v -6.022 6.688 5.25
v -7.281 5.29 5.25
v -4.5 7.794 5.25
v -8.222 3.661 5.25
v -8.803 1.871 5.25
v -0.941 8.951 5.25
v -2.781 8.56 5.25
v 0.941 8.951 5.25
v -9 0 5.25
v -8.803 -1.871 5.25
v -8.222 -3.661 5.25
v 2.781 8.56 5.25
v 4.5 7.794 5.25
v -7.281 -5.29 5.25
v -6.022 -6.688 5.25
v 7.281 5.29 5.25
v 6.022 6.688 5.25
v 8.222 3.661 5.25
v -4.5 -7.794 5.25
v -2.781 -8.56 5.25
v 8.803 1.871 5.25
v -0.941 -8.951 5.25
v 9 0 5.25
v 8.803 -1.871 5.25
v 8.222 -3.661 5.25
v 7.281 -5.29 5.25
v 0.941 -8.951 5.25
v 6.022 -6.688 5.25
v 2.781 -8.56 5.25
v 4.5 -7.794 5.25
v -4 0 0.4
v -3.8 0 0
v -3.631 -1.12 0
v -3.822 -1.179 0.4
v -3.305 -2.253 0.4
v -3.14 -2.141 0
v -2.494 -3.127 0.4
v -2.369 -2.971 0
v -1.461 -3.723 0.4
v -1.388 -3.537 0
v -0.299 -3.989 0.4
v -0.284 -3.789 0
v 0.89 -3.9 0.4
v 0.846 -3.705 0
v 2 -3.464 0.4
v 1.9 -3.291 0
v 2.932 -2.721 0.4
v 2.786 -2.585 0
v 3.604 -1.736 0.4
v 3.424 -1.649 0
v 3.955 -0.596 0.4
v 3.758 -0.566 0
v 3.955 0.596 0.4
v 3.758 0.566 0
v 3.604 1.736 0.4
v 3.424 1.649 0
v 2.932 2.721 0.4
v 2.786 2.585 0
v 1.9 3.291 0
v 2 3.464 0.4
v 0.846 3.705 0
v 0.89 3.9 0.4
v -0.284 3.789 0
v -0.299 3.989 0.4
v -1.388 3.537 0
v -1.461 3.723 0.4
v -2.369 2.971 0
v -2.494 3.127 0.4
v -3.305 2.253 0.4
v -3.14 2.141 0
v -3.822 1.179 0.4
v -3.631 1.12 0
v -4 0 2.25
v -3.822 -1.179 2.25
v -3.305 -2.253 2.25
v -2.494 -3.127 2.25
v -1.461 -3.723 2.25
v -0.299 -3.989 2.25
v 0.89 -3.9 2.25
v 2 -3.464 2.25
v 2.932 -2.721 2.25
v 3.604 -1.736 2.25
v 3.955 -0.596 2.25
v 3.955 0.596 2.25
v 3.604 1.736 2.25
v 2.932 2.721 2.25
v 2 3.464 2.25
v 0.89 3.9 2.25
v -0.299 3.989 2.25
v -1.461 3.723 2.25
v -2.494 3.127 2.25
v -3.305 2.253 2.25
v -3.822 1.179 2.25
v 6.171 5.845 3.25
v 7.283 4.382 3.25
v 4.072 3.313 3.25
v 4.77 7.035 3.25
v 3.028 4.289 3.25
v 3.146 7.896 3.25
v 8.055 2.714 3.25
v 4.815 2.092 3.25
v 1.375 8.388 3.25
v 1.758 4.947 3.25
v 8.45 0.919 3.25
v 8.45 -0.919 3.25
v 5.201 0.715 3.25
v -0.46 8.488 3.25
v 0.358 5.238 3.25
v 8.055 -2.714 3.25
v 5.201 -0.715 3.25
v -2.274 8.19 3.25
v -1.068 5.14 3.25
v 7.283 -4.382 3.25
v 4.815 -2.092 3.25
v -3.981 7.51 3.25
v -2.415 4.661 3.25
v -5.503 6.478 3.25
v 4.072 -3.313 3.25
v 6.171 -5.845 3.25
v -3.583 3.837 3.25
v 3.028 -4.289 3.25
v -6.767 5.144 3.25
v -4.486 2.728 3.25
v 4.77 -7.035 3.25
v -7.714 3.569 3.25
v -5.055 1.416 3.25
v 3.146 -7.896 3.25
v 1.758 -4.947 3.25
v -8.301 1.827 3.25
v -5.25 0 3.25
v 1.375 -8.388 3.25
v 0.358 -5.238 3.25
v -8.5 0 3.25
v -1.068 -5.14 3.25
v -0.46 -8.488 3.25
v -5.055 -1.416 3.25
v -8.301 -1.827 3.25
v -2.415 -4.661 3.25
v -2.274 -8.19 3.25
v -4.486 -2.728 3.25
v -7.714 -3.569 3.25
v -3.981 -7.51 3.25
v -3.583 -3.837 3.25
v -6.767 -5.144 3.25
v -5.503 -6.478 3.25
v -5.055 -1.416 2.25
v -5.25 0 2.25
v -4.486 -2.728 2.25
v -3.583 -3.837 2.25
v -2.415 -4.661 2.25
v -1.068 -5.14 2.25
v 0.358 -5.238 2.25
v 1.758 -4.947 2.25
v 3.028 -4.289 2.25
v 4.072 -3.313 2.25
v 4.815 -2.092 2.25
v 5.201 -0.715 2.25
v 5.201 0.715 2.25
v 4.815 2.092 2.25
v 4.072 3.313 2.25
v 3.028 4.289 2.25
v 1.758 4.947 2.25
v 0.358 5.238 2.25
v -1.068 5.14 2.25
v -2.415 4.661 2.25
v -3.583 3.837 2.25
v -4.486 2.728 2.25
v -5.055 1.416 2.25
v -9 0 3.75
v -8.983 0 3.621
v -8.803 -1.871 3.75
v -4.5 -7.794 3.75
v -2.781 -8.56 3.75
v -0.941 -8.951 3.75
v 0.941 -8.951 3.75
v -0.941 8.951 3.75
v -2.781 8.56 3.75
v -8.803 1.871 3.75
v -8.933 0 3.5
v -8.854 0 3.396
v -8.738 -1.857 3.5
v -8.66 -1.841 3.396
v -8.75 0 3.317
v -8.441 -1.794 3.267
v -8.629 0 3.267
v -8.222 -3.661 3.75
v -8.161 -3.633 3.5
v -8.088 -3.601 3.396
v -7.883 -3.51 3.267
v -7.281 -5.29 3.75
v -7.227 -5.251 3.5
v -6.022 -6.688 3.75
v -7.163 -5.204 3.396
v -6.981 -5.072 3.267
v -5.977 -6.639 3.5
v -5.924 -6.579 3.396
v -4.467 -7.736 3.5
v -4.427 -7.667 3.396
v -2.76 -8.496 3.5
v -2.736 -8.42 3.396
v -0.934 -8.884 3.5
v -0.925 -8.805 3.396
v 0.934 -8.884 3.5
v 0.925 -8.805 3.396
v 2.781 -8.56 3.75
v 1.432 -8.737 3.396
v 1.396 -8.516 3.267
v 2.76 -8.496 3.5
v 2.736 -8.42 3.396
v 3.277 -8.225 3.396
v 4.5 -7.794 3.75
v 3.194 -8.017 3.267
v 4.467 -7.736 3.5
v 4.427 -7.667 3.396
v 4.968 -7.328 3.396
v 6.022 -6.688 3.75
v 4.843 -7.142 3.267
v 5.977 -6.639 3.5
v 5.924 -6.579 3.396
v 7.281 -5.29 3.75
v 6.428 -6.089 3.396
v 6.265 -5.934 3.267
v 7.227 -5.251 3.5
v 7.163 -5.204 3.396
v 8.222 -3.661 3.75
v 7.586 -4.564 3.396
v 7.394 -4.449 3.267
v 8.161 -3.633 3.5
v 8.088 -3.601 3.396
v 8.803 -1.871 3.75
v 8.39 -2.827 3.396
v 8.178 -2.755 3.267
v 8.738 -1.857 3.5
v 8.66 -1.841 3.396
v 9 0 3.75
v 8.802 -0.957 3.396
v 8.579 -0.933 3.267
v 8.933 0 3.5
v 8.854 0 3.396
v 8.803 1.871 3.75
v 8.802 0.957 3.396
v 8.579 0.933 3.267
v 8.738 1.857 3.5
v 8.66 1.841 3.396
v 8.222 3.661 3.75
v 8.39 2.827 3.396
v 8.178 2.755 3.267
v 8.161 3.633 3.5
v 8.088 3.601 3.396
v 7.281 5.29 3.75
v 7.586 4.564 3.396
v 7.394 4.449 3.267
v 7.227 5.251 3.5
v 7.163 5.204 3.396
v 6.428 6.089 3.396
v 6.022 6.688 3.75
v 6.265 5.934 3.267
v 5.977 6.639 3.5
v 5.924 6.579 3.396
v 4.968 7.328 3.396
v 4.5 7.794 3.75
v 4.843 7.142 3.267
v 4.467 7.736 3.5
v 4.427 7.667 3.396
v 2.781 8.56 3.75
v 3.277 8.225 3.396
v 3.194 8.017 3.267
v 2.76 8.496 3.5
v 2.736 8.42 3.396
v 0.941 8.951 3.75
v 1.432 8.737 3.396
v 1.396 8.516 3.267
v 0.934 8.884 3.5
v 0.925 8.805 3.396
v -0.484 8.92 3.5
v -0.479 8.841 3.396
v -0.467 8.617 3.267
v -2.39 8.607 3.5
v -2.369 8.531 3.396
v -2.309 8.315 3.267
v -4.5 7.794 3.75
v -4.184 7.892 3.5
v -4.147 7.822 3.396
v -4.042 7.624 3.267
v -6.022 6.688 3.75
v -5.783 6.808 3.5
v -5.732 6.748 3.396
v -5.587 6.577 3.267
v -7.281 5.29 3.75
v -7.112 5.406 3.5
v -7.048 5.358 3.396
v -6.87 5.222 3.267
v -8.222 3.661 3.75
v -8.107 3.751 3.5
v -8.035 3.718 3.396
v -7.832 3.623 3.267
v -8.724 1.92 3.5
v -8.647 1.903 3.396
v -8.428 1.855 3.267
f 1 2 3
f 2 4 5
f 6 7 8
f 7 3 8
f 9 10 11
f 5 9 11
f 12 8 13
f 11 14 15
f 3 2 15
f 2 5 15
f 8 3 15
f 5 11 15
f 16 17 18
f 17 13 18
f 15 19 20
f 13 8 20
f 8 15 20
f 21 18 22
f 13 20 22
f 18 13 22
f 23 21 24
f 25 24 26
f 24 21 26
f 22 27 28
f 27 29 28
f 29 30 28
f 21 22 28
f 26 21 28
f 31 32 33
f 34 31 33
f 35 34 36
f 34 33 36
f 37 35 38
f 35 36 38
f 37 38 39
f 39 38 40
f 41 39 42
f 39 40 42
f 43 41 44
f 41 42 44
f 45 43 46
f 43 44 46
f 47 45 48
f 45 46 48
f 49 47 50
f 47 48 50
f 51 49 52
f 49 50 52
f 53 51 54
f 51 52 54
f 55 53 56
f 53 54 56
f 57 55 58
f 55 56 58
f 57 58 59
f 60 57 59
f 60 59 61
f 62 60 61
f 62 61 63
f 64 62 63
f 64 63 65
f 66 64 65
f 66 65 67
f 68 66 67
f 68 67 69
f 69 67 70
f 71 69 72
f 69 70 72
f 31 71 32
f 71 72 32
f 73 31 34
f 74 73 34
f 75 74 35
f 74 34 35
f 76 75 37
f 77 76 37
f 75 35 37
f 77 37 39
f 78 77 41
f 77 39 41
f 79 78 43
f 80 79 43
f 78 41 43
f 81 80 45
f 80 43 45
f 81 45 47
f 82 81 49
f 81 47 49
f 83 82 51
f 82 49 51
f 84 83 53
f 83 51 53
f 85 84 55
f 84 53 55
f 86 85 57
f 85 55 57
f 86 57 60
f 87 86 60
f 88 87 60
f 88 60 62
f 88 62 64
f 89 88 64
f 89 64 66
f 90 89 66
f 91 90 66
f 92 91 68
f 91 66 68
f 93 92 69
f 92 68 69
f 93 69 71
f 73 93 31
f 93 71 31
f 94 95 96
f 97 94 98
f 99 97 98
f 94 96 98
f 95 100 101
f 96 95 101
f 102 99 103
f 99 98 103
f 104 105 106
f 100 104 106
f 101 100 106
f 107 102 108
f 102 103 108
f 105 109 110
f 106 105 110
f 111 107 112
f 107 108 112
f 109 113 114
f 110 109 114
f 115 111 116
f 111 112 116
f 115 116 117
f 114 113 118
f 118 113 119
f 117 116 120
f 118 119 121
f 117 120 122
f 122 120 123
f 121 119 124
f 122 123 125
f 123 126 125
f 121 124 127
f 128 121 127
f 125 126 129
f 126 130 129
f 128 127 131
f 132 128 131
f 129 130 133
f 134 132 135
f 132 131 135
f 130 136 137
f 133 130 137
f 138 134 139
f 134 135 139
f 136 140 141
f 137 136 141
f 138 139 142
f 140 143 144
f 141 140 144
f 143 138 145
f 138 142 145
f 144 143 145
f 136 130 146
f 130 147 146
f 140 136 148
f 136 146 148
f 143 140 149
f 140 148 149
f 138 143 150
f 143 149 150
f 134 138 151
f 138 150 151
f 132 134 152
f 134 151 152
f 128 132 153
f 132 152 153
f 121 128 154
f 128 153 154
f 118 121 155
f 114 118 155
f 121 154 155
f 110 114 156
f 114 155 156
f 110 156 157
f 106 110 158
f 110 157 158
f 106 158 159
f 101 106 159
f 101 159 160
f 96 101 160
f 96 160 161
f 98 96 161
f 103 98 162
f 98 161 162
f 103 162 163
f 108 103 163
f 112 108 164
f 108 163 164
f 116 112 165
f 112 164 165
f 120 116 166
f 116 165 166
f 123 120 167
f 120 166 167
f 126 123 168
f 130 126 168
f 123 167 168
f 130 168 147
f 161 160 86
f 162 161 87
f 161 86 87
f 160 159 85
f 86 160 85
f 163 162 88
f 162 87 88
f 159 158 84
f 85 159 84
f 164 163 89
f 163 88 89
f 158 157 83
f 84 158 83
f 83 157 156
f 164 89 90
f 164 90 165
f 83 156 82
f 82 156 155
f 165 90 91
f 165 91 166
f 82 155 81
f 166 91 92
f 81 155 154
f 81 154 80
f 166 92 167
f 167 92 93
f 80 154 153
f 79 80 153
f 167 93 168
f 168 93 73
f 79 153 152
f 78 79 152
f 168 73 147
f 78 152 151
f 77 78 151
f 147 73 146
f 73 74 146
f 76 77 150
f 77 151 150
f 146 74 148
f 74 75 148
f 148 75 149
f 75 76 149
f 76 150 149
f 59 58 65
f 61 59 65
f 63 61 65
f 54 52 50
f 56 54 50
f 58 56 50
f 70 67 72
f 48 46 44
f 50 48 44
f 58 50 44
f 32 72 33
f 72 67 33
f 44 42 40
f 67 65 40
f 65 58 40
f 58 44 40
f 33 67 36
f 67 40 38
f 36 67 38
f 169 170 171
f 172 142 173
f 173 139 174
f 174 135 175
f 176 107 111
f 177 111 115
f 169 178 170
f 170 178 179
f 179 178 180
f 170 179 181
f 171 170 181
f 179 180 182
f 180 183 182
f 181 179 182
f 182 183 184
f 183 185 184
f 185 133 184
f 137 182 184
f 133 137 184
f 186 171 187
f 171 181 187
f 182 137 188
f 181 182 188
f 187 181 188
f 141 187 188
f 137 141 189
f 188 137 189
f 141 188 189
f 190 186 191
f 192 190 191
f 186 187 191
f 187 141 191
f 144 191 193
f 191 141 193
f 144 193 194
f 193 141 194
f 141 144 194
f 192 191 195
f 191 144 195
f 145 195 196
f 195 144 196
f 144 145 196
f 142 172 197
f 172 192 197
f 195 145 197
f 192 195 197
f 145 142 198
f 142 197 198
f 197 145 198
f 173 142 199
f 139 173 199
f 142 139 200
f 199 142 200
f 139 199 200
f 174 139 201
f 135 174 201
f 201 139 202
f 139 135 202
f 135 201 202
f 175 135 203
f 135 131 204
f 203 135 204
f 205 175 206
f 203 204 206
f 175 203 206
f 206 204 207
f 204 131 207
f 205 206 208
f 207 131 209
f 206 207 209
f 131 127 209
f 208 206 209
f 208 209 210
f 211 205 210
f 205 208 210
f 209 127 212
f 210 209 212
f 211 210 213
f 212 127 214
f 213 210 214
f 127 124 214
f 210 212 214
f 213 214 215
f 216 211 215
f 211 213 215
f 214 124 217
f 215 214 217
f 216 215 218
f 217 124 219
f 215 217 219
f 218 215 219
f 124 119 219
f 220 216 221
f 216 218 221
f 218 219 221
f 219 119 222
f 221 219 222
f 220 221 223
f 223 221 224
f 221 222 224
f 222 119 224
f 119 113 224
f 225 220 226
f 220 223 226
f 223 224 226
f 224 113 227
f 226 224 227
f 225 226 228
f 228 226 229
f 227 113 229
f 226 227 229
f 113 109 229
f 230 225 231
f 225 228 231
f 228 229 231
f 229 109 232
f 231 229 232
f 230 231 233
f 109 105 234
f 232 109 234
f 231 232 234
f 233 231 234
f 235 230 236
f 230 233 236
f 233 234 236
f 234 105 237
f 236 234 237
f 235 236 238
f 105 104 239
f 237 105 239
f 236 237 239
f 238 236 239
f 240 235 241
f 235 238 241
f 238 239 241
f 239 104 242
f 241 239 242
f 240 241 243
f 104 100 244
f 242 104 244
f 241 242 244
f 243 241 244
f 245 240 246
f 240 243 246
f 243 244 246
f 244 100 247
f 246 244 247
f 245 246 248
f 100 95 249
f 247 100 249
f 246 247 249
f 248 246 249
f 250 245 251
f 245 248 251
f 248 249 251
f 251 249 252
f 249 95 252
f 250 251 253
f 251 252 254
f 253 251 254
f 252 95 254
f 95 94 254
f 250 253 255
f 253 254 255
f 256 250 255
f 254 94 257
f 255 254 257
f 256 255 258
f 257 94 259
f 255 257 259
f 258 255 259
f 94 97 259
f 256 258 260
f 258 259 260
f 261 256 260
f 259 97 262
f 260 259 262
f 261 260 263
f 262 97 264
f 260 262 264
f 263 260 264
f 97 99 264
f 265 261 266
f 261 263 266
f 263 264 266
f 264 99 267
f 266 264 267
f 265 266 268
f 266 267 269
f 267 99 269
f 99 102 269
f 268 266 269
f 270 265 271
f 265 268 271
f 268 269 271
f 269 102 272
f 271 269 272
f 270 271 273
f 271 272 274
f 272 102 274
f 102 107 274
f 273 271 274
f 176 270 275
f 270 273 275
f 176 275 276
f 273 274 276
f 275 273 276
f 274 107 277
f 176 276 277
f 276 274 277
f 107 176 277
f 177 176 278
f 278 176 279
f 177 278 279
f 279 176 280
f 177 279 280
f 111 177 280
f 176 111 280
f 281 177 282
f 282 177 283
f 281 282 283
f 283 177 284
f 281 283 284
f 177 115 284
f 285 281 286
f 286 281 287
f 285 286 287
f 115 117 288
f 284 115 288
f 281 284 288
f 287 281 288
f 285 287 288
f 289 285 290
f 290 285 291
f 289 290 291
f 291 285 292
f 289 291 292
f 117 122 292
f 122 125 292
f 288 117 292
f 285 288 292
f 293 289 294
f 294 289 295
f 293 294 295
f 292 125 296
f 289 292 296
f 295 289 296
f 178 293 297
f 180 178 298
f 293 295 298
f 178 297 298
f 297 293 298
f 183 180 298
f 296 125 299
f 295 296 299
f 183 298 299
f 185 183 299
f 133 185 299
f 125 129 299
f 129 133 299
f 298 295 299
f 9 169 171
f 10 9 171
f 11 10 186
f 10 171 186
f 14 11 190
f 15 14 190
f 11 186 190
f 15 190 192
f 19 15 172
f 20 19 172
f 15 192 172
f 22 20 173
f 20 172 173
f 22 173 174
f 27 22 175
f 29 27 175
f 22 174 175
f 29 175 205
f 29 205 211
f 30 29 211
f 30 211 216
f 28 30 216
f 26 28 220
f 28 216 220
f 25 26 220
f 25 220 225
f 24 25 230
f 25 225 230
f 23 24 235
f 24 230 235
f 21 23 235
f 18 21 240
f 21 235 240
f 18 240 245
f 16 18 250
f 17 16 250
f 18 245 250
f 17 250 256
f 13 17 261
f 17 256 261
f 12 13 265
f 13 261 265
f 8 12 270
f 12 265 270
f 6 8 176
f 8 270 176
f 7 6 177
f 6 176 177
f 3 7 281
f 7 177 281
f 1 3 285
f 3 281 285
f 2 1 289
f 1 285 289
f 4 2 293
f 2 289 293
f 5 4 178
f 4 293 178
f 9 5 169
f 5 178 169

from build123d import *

# Parameters (mm, degrees)
F2_R     = 0.5
F3_SIZE2 = 0.2
F3_SIZE  = 0.4


with BuildPart() as f1:
    # F0 (on Front) → F1 (revolve)
    with BuildSketch(Plane.XZ):
        Polygon((-4, 0), (0, 0), (0, 5.25), (-9, 5.25), (-9, 3.25), (-5.25, 3.25), (-5.25, 2.25), (-4, 2.25), align=None)
    revolve(axis=Axis((0, 0, 2.625), (0, 0, 1)))

    # F2
    f2_edges = [f1.edges().sort_by_distance(p)[0] for p in [
        (9, 0, 3.25),
    ]]
    fillet(f2_edges, radius=F2_R)

    # F3
    f3_edges = [f1.edges().sort_by_distance(p)[0] for p in [
        (4, 0, 0),
    ]]
    f3_side = f1.faces().sort_by_distance((4, 0, 1.125))[0]
    chamfer(f3_edges, length=F3_SIZE, length2=F3_SIZE2, reference=f3_side)


solid = f1.part
